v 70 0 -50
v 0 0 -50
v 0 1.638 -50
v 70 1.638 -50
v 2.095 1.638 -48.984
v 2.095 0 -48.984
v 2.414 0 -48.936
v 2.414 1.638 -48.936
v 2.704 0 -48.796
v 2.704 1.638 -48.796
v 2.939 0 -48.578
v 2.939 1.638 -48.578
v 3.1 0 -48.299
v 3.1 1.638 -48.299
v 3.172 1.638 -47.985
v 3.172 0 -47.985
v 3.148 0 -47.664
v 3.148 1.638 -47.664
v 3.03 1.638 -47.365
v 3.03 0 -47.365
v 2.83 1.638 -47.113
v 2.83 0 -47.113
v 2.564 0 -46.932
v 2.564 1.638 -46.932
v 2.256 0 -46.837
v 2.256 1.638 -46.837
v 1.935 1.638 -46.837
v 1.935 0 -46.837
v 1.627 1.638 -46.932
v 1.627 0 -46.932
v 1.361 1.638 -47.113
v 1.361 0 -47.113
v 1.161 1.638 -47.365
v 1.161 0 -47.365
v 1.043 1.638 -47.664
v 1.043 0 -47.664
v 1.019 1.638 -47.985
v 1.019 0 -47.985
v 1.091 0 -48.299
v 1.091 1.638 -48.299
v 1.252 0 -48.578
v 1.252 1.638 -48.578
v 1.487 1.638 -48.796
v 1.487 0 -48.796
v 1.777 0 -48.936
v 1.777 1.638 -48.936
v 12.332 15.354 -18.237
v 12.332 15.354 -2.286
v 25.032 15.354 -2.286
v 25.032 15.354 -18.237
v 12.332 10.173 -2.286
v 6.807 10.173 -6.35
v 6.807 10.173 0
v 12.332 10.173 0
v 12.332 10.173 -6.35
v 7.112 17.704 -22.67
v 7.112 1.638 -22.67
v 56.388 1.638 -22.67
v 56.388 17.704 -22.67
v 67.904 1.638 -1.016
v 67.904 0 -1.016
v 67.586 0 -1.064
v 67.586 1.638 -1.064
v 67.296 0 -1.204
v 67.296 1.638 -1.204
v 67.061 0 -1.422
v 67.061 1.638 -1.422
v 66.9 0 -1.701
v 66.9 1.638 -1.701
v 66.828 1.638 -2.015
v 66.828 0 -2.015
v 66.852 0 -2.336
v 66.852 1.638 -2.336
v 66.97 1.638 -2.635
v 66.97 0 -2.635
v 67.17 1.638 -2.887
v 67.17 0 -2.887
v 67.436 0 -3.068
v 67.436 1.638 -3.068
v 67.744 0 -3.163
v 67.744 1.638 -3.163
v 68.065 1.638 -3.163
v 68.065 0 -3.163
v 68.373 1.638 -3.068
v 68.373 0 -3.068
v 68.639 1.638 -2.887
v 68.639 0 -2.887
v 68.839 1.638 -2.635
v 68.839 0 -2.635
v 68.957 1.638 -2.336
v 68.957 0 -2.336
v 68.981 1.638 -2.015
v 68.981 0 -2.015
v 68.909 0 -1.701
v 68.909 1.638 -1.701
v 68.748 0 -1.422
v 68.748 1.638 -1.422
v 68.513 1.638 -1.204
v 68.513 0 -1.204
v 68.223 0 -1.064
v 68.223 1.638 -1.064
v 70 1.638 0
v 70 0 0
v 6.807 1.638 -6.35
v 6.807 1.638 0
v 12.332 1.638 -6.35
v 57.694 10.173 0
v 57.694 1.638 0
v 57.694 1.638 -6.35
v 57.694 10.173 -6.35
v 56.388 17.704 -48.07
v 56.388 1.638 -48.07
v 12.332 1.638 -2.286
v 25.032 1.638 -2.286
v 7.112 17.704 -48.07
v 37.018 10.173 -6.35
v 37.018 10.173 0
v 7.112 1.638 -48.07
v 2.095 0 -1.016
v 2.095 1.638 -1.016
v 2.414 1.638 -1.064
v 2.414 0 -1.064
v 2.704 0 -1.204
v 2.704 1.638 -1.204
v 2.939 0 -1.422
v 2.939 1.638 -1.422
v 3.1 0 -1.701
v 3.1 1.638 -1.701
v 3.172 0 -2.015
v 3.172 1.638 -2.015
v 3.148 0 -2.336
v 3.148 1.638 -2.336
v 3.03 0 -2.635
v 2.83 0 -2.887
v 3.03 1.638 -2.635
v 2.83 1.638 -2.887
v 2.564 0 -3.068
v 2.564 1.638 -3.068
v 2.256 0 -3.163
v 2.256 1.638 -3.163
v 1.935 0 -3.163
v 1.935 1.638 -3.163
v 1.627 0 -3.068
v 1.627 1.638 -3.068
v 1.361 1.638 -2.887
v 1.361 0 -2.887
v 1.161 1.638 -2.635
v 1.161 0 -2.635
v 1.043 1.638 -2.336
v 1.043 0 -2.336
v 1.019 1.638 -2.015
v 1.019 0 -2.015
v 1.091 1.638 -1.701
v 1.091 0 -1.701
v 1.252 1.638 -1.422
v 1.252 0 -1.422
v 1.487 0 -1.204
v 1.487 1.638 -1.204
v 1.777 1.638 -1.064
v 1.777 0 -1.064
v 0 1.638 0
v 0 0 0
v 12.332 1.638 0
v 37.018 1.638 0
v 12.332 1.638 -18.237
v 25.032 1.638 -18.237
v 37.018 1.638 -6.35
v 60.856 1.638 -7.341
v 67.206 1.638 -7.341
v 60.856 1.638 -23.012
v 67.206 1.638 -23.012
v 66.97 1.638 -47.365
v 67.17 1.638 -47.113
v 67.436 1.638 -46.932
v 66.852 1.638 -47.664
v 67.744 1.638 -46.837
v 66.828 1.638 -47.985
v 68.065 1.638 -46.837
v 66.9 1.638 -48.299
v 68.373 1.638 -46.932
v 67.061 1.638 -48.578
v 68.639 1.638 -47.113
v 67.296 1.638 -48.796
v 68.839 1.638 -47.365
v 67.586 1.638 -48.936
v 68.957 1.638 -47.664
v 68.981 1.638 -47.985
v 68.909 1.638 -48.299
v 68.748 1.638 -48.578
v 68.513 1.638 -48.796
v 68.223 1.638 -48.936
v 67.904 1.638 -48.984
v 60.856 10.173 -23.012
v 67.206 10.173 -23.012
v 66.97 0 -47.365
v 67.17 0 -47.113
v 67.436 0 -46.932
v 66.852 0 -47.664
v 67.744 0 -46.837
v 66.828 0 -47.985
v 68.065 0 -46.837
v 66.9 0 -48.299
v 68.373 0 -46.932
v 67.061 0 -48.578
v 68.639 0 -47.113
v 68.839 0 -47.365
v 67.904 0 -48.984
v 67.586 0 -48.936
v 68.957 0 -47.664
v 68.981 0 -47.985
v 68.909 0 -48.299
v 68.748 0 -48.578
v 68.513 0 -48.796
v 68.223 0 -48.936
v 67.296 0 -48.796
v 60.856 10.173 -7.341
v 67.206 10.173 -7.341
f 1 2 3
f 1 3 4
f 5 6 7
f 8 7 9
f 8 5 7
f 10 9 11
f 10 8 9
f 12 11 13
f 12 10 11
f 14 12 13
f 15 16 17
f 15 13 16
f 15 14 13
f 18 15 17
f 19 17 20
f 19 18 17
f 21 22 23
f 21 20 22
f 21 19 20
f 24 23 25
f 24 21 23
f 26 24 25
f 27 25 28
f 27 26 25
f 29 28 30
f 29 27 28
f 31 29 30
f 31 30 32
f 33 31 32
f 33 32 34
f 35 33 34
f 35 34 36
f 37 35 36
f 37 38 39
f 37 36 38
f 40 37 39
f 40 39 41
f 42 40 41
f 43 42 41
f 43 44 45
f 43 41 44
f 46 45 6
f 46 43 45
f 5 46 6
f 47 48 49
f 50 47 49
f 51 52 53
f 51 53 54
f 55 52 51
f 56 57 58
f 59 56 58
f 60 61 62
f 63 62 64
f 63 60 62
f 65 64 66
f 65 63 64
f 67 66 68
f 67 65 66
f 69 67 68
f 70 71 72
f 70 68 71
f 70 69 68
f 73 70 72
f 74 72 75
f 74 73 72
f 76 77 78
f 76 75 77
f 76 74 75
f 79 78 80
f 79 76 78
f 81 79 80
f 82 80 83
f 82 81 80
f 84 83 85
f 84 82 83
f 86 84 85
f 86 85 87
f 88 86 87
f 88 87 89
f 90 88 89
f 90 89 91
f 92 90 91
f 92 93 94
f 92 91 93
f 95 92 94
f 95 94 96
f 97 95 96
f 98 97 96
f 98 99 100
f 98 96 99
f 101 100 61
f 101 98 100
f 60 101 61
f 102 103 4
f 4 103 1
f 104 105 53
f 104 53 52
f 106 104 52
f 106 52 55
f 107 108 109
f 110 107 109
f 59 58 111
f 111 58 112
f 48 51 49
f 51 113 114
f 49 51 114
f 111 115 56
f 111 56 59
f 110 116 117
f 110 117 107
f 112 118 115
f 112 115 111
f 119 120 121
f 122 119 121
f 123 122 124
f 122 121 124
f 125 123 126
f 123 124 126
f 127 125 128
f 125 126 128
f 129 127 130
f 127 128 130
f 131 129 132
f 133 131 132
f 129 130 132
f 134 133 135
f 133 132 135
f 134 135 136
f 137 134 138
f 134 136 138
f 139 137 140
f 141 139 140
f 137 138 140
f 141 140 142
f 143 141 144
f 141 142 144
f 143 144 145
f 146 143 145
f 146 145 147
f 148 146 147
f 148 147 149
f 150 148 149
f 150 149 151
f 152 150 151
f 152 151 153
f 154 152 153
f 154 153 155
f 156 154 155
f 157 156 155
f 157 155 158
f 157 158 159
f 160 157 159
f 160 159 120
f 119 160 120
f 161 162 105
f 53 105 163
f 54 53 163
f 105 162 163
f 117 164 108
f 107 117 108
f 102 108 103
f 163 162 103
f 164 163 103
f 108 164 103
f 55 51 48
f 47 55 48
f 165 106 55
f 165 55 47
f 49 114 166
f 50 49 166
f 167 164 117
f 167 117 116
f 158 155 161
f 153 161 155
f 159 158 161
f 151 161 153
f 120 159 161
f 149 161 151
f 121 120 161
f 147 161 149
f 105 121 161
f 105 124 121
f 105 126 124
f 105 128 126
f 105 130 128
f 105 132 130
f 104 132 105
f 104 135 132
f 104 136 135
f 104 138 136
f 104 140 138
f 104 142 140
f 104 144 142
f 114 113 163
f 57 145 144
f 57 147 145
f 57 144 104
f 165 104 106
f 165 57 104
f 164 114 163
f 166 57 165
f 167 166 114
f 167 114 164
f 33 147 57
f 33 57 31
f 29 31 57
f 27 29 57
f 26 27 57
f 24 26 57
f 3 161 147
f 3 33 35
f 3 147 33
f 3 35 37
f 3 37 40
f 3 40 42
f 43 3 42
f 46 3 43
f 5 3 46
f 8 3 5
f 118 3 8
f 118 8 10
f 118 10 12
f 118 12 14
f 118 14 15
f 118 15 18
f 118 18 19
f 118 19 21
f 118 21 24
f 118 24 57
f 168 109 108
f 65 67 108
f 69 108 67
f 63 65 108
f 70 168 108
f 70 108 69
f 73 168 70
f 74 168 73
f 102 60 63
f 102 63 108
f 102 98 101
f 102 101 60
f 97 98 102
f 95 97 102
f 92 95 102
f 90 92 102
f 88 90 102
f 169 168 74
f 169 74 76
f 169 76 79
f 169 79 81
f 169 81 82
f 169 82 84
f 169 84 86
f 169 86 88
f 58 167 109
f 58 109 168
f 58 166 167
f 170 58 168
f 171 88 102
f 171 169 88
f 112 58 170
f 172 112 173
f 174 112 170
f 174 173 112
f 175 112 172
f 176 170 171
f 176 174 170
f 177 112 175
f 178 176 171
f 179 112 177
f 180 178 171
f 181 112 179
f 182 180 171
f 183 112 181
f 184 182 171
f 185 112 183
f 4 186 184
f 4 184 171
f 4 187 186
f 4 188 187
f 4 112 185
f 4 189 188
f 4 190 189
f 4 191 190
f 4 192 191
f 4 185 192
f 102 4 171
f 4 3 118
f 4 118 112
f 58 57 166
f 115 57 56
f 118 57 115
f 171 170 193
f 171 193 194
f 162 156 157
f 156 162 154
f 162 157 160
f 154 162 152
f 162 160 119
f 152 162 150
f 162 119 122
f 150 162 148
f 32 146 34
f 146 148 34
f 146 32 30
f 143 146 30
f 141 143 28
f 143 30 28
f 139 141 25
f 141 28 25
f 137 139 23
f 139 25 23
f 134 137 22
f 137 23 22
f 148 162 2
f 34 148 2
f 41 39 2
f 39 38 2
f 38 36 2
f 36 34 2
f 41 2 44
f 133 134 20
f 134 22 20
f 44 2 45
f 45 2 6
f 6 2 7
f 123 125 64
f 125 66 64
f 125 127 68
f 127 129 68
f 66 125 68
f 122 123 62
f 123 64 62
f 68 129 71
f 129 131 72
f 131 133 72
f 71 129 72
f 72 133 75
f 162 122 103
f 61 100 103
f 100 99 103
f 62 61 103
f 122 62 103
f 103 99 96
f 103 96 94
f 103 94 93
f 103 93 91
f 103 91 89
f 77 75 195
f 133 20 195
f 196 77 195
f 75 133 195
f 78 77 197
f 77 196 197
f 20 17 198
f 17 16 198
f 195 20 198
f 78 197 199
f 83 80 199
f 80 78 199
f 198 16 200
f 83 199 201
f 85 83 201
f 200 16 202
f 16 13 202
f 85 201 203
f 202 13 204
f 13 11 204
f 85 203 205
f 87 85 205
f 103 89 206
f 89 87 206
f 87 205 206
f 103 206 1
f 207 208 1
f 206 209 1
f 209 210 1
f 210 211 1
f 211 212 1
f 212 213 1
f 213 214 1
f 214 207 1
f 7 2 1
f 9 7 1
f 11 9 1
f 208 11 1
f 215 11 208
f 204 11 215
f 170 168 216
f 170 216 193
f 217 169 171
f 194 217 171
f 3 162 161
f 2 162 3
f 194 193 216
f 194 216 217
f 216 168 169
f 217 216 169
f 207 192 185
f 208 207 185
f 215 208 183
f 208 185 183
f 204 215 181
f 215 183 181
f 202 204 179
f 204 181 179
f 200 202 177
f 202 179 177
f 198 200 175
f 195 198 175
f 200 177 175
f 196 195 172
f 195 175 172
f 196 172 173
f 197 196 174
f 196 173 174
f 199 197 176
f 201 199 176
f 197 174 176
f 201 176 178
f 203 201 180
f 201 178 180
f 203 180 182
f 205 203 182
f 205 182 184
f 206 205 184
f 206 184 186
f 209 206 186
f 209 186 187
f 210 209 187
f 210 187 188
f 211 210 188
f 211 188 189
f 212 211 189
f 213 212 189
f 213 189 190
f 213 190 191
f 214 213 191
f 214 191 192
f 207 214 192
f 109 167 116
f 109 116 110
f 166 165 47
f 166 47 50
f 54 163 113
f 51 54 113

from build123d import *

# Parameters (mm, degrees)
SKETCH1_W               = 70
SKETCH1_H               = 50
BOSS_EXTRUDE1_DEPTH     = 1.6383
SKETCH3_R               = 1.0795
CUT_EXTRUDE2_DEPTH      = 87.038851845
MIRROR2_COPY_1_SKETCH_R = 1.0795
MIRROR2_COPY_1_DEPTH    = 87.038851845
SKETCH4_W               = 6.35
SKETCH4_H               = 15.6718
SKETCH4_W_2             = 20.6756
SKETCH4_H_2             = 6.35
SKETCH4_W_3             = 5.5245
BOSS_EXTRUDE2_DEPTH     = 8.5344
SKETCH5_W               = 12.7
SKETCH5_H               = 15.9512
BOSS_EXTRUDE3_DEPTH     = 13.716
SKETCH7_W               = 49.276
SKETCH7_H               = 25.4
BOSS_EXTRUDE4_DEPTH     = 16.0655


with BuildPart() as part:
    # Sketch1 → Boss-Extrude1 (new body)
    with BuildSketch(Plane(origin=(0, 0, 0), x_dir=(1, 0, 0), z_dir=(0, 1, 0))):
        with Locations((35, 25)):
            Rectangle(SKETCH1_W, SKETCH1_H)
    extrude(amount=BOSS_EXTRUDE1_DEPTH)

    # Sketch3 → Cut-Extrude2 (cut, through all)
    with BuildSketch(Plane(origin=(0, 1.6383, 0), x_dir=(1, 0, 0), z_dir=(0, 1, 0))):
        with Locations(Location((2.0955, 2.0955, 0), (0, 0, 270))):
            Circle(SKETCH3_R)
    cut_extrude2 = extrude(amount=-CUT_EXTRUDE2_DEPTH, mode=Mode.SUBTRACT)

    # Mirror1: Cut-Extrude2 across plane
    add(cut_extrude2.mirror(Plane.XY.offset(-25)), mode=Mode.SUBTRACT)

    # Mirror2: Cut-Extrude2 across plane
    add(cut_extrude2.mirror(Plane(origin=(35, 0, 0), x_dir=(0, 0, 1), z_dir=(1, 0, 0))), mode=Mode.SUBTRACT)

    # Mirror2 copy 1 sketch → Mirror2 copy 1 (cut, through all)
    with BuildSketch(Plane(origin=(70, 1.6383, -50), x_dir=(-1, 0, 0), z_dir=(0, 1, 0))):
        with Locations(Location((2.0955, 2.0955, 0), (0, 0, 270))):
            Circle(MIRROR2_COPY_1_SKETCH_R)
    extrude(amount=-MIRROR2_COPY_1_DEPTH, mode=Mode.SUBTRACT)

    # Sketch4 → Boss-Extrude2 (add)
    with BuildSketch(Plane(origin=(0, 1.6383, 0), x_dir=(1, 0, 0), z_dir=(0, 1, 0))):
        with Locations((64.031, 15.1765)):
            Rectangle(SKETCH4_W, SKETCH4_H)
        with Locations((47.3559, 3.175)):
            Rectangle(SKETCH4_W_2, SKETCH4_H_2)
        with Locations((9.56945, 3.175)):
            Rectangle(SKETCH4_W_3, SKETCH4_H_2)
    extrude(amount=BOSS_EXTRUDE2_DEPTH)

    # Sketch5 → Boss-Extrude3 (add)
    with BuildSketch(Plane(origin=(0, 1.6383, 0), x_dir=(1, 0, 0), z_dir=(0, 1, 0))):
        with Locations((18.6817, 10.2616)):
            Rectangle(SKETCH5_W, SKETCH5_H)
    extrude(amount=BOSS_EXTRUDE3_DEPTH)

    # Sketch7 → Boss-Extrude4 (add)
    with BuildSketch(Plane(origin=(0, 1.6383, 0), x_dir=(1, 0, 0), z_dir=(0, 1, 0))):
        with Locations((31.75, 35.3696)):
            Rectangle(SKETCH7_W, SKETCH7_H)
    extrude(amount=BOSS_EXTRUDE4_DEPTH)


solid = part.part
